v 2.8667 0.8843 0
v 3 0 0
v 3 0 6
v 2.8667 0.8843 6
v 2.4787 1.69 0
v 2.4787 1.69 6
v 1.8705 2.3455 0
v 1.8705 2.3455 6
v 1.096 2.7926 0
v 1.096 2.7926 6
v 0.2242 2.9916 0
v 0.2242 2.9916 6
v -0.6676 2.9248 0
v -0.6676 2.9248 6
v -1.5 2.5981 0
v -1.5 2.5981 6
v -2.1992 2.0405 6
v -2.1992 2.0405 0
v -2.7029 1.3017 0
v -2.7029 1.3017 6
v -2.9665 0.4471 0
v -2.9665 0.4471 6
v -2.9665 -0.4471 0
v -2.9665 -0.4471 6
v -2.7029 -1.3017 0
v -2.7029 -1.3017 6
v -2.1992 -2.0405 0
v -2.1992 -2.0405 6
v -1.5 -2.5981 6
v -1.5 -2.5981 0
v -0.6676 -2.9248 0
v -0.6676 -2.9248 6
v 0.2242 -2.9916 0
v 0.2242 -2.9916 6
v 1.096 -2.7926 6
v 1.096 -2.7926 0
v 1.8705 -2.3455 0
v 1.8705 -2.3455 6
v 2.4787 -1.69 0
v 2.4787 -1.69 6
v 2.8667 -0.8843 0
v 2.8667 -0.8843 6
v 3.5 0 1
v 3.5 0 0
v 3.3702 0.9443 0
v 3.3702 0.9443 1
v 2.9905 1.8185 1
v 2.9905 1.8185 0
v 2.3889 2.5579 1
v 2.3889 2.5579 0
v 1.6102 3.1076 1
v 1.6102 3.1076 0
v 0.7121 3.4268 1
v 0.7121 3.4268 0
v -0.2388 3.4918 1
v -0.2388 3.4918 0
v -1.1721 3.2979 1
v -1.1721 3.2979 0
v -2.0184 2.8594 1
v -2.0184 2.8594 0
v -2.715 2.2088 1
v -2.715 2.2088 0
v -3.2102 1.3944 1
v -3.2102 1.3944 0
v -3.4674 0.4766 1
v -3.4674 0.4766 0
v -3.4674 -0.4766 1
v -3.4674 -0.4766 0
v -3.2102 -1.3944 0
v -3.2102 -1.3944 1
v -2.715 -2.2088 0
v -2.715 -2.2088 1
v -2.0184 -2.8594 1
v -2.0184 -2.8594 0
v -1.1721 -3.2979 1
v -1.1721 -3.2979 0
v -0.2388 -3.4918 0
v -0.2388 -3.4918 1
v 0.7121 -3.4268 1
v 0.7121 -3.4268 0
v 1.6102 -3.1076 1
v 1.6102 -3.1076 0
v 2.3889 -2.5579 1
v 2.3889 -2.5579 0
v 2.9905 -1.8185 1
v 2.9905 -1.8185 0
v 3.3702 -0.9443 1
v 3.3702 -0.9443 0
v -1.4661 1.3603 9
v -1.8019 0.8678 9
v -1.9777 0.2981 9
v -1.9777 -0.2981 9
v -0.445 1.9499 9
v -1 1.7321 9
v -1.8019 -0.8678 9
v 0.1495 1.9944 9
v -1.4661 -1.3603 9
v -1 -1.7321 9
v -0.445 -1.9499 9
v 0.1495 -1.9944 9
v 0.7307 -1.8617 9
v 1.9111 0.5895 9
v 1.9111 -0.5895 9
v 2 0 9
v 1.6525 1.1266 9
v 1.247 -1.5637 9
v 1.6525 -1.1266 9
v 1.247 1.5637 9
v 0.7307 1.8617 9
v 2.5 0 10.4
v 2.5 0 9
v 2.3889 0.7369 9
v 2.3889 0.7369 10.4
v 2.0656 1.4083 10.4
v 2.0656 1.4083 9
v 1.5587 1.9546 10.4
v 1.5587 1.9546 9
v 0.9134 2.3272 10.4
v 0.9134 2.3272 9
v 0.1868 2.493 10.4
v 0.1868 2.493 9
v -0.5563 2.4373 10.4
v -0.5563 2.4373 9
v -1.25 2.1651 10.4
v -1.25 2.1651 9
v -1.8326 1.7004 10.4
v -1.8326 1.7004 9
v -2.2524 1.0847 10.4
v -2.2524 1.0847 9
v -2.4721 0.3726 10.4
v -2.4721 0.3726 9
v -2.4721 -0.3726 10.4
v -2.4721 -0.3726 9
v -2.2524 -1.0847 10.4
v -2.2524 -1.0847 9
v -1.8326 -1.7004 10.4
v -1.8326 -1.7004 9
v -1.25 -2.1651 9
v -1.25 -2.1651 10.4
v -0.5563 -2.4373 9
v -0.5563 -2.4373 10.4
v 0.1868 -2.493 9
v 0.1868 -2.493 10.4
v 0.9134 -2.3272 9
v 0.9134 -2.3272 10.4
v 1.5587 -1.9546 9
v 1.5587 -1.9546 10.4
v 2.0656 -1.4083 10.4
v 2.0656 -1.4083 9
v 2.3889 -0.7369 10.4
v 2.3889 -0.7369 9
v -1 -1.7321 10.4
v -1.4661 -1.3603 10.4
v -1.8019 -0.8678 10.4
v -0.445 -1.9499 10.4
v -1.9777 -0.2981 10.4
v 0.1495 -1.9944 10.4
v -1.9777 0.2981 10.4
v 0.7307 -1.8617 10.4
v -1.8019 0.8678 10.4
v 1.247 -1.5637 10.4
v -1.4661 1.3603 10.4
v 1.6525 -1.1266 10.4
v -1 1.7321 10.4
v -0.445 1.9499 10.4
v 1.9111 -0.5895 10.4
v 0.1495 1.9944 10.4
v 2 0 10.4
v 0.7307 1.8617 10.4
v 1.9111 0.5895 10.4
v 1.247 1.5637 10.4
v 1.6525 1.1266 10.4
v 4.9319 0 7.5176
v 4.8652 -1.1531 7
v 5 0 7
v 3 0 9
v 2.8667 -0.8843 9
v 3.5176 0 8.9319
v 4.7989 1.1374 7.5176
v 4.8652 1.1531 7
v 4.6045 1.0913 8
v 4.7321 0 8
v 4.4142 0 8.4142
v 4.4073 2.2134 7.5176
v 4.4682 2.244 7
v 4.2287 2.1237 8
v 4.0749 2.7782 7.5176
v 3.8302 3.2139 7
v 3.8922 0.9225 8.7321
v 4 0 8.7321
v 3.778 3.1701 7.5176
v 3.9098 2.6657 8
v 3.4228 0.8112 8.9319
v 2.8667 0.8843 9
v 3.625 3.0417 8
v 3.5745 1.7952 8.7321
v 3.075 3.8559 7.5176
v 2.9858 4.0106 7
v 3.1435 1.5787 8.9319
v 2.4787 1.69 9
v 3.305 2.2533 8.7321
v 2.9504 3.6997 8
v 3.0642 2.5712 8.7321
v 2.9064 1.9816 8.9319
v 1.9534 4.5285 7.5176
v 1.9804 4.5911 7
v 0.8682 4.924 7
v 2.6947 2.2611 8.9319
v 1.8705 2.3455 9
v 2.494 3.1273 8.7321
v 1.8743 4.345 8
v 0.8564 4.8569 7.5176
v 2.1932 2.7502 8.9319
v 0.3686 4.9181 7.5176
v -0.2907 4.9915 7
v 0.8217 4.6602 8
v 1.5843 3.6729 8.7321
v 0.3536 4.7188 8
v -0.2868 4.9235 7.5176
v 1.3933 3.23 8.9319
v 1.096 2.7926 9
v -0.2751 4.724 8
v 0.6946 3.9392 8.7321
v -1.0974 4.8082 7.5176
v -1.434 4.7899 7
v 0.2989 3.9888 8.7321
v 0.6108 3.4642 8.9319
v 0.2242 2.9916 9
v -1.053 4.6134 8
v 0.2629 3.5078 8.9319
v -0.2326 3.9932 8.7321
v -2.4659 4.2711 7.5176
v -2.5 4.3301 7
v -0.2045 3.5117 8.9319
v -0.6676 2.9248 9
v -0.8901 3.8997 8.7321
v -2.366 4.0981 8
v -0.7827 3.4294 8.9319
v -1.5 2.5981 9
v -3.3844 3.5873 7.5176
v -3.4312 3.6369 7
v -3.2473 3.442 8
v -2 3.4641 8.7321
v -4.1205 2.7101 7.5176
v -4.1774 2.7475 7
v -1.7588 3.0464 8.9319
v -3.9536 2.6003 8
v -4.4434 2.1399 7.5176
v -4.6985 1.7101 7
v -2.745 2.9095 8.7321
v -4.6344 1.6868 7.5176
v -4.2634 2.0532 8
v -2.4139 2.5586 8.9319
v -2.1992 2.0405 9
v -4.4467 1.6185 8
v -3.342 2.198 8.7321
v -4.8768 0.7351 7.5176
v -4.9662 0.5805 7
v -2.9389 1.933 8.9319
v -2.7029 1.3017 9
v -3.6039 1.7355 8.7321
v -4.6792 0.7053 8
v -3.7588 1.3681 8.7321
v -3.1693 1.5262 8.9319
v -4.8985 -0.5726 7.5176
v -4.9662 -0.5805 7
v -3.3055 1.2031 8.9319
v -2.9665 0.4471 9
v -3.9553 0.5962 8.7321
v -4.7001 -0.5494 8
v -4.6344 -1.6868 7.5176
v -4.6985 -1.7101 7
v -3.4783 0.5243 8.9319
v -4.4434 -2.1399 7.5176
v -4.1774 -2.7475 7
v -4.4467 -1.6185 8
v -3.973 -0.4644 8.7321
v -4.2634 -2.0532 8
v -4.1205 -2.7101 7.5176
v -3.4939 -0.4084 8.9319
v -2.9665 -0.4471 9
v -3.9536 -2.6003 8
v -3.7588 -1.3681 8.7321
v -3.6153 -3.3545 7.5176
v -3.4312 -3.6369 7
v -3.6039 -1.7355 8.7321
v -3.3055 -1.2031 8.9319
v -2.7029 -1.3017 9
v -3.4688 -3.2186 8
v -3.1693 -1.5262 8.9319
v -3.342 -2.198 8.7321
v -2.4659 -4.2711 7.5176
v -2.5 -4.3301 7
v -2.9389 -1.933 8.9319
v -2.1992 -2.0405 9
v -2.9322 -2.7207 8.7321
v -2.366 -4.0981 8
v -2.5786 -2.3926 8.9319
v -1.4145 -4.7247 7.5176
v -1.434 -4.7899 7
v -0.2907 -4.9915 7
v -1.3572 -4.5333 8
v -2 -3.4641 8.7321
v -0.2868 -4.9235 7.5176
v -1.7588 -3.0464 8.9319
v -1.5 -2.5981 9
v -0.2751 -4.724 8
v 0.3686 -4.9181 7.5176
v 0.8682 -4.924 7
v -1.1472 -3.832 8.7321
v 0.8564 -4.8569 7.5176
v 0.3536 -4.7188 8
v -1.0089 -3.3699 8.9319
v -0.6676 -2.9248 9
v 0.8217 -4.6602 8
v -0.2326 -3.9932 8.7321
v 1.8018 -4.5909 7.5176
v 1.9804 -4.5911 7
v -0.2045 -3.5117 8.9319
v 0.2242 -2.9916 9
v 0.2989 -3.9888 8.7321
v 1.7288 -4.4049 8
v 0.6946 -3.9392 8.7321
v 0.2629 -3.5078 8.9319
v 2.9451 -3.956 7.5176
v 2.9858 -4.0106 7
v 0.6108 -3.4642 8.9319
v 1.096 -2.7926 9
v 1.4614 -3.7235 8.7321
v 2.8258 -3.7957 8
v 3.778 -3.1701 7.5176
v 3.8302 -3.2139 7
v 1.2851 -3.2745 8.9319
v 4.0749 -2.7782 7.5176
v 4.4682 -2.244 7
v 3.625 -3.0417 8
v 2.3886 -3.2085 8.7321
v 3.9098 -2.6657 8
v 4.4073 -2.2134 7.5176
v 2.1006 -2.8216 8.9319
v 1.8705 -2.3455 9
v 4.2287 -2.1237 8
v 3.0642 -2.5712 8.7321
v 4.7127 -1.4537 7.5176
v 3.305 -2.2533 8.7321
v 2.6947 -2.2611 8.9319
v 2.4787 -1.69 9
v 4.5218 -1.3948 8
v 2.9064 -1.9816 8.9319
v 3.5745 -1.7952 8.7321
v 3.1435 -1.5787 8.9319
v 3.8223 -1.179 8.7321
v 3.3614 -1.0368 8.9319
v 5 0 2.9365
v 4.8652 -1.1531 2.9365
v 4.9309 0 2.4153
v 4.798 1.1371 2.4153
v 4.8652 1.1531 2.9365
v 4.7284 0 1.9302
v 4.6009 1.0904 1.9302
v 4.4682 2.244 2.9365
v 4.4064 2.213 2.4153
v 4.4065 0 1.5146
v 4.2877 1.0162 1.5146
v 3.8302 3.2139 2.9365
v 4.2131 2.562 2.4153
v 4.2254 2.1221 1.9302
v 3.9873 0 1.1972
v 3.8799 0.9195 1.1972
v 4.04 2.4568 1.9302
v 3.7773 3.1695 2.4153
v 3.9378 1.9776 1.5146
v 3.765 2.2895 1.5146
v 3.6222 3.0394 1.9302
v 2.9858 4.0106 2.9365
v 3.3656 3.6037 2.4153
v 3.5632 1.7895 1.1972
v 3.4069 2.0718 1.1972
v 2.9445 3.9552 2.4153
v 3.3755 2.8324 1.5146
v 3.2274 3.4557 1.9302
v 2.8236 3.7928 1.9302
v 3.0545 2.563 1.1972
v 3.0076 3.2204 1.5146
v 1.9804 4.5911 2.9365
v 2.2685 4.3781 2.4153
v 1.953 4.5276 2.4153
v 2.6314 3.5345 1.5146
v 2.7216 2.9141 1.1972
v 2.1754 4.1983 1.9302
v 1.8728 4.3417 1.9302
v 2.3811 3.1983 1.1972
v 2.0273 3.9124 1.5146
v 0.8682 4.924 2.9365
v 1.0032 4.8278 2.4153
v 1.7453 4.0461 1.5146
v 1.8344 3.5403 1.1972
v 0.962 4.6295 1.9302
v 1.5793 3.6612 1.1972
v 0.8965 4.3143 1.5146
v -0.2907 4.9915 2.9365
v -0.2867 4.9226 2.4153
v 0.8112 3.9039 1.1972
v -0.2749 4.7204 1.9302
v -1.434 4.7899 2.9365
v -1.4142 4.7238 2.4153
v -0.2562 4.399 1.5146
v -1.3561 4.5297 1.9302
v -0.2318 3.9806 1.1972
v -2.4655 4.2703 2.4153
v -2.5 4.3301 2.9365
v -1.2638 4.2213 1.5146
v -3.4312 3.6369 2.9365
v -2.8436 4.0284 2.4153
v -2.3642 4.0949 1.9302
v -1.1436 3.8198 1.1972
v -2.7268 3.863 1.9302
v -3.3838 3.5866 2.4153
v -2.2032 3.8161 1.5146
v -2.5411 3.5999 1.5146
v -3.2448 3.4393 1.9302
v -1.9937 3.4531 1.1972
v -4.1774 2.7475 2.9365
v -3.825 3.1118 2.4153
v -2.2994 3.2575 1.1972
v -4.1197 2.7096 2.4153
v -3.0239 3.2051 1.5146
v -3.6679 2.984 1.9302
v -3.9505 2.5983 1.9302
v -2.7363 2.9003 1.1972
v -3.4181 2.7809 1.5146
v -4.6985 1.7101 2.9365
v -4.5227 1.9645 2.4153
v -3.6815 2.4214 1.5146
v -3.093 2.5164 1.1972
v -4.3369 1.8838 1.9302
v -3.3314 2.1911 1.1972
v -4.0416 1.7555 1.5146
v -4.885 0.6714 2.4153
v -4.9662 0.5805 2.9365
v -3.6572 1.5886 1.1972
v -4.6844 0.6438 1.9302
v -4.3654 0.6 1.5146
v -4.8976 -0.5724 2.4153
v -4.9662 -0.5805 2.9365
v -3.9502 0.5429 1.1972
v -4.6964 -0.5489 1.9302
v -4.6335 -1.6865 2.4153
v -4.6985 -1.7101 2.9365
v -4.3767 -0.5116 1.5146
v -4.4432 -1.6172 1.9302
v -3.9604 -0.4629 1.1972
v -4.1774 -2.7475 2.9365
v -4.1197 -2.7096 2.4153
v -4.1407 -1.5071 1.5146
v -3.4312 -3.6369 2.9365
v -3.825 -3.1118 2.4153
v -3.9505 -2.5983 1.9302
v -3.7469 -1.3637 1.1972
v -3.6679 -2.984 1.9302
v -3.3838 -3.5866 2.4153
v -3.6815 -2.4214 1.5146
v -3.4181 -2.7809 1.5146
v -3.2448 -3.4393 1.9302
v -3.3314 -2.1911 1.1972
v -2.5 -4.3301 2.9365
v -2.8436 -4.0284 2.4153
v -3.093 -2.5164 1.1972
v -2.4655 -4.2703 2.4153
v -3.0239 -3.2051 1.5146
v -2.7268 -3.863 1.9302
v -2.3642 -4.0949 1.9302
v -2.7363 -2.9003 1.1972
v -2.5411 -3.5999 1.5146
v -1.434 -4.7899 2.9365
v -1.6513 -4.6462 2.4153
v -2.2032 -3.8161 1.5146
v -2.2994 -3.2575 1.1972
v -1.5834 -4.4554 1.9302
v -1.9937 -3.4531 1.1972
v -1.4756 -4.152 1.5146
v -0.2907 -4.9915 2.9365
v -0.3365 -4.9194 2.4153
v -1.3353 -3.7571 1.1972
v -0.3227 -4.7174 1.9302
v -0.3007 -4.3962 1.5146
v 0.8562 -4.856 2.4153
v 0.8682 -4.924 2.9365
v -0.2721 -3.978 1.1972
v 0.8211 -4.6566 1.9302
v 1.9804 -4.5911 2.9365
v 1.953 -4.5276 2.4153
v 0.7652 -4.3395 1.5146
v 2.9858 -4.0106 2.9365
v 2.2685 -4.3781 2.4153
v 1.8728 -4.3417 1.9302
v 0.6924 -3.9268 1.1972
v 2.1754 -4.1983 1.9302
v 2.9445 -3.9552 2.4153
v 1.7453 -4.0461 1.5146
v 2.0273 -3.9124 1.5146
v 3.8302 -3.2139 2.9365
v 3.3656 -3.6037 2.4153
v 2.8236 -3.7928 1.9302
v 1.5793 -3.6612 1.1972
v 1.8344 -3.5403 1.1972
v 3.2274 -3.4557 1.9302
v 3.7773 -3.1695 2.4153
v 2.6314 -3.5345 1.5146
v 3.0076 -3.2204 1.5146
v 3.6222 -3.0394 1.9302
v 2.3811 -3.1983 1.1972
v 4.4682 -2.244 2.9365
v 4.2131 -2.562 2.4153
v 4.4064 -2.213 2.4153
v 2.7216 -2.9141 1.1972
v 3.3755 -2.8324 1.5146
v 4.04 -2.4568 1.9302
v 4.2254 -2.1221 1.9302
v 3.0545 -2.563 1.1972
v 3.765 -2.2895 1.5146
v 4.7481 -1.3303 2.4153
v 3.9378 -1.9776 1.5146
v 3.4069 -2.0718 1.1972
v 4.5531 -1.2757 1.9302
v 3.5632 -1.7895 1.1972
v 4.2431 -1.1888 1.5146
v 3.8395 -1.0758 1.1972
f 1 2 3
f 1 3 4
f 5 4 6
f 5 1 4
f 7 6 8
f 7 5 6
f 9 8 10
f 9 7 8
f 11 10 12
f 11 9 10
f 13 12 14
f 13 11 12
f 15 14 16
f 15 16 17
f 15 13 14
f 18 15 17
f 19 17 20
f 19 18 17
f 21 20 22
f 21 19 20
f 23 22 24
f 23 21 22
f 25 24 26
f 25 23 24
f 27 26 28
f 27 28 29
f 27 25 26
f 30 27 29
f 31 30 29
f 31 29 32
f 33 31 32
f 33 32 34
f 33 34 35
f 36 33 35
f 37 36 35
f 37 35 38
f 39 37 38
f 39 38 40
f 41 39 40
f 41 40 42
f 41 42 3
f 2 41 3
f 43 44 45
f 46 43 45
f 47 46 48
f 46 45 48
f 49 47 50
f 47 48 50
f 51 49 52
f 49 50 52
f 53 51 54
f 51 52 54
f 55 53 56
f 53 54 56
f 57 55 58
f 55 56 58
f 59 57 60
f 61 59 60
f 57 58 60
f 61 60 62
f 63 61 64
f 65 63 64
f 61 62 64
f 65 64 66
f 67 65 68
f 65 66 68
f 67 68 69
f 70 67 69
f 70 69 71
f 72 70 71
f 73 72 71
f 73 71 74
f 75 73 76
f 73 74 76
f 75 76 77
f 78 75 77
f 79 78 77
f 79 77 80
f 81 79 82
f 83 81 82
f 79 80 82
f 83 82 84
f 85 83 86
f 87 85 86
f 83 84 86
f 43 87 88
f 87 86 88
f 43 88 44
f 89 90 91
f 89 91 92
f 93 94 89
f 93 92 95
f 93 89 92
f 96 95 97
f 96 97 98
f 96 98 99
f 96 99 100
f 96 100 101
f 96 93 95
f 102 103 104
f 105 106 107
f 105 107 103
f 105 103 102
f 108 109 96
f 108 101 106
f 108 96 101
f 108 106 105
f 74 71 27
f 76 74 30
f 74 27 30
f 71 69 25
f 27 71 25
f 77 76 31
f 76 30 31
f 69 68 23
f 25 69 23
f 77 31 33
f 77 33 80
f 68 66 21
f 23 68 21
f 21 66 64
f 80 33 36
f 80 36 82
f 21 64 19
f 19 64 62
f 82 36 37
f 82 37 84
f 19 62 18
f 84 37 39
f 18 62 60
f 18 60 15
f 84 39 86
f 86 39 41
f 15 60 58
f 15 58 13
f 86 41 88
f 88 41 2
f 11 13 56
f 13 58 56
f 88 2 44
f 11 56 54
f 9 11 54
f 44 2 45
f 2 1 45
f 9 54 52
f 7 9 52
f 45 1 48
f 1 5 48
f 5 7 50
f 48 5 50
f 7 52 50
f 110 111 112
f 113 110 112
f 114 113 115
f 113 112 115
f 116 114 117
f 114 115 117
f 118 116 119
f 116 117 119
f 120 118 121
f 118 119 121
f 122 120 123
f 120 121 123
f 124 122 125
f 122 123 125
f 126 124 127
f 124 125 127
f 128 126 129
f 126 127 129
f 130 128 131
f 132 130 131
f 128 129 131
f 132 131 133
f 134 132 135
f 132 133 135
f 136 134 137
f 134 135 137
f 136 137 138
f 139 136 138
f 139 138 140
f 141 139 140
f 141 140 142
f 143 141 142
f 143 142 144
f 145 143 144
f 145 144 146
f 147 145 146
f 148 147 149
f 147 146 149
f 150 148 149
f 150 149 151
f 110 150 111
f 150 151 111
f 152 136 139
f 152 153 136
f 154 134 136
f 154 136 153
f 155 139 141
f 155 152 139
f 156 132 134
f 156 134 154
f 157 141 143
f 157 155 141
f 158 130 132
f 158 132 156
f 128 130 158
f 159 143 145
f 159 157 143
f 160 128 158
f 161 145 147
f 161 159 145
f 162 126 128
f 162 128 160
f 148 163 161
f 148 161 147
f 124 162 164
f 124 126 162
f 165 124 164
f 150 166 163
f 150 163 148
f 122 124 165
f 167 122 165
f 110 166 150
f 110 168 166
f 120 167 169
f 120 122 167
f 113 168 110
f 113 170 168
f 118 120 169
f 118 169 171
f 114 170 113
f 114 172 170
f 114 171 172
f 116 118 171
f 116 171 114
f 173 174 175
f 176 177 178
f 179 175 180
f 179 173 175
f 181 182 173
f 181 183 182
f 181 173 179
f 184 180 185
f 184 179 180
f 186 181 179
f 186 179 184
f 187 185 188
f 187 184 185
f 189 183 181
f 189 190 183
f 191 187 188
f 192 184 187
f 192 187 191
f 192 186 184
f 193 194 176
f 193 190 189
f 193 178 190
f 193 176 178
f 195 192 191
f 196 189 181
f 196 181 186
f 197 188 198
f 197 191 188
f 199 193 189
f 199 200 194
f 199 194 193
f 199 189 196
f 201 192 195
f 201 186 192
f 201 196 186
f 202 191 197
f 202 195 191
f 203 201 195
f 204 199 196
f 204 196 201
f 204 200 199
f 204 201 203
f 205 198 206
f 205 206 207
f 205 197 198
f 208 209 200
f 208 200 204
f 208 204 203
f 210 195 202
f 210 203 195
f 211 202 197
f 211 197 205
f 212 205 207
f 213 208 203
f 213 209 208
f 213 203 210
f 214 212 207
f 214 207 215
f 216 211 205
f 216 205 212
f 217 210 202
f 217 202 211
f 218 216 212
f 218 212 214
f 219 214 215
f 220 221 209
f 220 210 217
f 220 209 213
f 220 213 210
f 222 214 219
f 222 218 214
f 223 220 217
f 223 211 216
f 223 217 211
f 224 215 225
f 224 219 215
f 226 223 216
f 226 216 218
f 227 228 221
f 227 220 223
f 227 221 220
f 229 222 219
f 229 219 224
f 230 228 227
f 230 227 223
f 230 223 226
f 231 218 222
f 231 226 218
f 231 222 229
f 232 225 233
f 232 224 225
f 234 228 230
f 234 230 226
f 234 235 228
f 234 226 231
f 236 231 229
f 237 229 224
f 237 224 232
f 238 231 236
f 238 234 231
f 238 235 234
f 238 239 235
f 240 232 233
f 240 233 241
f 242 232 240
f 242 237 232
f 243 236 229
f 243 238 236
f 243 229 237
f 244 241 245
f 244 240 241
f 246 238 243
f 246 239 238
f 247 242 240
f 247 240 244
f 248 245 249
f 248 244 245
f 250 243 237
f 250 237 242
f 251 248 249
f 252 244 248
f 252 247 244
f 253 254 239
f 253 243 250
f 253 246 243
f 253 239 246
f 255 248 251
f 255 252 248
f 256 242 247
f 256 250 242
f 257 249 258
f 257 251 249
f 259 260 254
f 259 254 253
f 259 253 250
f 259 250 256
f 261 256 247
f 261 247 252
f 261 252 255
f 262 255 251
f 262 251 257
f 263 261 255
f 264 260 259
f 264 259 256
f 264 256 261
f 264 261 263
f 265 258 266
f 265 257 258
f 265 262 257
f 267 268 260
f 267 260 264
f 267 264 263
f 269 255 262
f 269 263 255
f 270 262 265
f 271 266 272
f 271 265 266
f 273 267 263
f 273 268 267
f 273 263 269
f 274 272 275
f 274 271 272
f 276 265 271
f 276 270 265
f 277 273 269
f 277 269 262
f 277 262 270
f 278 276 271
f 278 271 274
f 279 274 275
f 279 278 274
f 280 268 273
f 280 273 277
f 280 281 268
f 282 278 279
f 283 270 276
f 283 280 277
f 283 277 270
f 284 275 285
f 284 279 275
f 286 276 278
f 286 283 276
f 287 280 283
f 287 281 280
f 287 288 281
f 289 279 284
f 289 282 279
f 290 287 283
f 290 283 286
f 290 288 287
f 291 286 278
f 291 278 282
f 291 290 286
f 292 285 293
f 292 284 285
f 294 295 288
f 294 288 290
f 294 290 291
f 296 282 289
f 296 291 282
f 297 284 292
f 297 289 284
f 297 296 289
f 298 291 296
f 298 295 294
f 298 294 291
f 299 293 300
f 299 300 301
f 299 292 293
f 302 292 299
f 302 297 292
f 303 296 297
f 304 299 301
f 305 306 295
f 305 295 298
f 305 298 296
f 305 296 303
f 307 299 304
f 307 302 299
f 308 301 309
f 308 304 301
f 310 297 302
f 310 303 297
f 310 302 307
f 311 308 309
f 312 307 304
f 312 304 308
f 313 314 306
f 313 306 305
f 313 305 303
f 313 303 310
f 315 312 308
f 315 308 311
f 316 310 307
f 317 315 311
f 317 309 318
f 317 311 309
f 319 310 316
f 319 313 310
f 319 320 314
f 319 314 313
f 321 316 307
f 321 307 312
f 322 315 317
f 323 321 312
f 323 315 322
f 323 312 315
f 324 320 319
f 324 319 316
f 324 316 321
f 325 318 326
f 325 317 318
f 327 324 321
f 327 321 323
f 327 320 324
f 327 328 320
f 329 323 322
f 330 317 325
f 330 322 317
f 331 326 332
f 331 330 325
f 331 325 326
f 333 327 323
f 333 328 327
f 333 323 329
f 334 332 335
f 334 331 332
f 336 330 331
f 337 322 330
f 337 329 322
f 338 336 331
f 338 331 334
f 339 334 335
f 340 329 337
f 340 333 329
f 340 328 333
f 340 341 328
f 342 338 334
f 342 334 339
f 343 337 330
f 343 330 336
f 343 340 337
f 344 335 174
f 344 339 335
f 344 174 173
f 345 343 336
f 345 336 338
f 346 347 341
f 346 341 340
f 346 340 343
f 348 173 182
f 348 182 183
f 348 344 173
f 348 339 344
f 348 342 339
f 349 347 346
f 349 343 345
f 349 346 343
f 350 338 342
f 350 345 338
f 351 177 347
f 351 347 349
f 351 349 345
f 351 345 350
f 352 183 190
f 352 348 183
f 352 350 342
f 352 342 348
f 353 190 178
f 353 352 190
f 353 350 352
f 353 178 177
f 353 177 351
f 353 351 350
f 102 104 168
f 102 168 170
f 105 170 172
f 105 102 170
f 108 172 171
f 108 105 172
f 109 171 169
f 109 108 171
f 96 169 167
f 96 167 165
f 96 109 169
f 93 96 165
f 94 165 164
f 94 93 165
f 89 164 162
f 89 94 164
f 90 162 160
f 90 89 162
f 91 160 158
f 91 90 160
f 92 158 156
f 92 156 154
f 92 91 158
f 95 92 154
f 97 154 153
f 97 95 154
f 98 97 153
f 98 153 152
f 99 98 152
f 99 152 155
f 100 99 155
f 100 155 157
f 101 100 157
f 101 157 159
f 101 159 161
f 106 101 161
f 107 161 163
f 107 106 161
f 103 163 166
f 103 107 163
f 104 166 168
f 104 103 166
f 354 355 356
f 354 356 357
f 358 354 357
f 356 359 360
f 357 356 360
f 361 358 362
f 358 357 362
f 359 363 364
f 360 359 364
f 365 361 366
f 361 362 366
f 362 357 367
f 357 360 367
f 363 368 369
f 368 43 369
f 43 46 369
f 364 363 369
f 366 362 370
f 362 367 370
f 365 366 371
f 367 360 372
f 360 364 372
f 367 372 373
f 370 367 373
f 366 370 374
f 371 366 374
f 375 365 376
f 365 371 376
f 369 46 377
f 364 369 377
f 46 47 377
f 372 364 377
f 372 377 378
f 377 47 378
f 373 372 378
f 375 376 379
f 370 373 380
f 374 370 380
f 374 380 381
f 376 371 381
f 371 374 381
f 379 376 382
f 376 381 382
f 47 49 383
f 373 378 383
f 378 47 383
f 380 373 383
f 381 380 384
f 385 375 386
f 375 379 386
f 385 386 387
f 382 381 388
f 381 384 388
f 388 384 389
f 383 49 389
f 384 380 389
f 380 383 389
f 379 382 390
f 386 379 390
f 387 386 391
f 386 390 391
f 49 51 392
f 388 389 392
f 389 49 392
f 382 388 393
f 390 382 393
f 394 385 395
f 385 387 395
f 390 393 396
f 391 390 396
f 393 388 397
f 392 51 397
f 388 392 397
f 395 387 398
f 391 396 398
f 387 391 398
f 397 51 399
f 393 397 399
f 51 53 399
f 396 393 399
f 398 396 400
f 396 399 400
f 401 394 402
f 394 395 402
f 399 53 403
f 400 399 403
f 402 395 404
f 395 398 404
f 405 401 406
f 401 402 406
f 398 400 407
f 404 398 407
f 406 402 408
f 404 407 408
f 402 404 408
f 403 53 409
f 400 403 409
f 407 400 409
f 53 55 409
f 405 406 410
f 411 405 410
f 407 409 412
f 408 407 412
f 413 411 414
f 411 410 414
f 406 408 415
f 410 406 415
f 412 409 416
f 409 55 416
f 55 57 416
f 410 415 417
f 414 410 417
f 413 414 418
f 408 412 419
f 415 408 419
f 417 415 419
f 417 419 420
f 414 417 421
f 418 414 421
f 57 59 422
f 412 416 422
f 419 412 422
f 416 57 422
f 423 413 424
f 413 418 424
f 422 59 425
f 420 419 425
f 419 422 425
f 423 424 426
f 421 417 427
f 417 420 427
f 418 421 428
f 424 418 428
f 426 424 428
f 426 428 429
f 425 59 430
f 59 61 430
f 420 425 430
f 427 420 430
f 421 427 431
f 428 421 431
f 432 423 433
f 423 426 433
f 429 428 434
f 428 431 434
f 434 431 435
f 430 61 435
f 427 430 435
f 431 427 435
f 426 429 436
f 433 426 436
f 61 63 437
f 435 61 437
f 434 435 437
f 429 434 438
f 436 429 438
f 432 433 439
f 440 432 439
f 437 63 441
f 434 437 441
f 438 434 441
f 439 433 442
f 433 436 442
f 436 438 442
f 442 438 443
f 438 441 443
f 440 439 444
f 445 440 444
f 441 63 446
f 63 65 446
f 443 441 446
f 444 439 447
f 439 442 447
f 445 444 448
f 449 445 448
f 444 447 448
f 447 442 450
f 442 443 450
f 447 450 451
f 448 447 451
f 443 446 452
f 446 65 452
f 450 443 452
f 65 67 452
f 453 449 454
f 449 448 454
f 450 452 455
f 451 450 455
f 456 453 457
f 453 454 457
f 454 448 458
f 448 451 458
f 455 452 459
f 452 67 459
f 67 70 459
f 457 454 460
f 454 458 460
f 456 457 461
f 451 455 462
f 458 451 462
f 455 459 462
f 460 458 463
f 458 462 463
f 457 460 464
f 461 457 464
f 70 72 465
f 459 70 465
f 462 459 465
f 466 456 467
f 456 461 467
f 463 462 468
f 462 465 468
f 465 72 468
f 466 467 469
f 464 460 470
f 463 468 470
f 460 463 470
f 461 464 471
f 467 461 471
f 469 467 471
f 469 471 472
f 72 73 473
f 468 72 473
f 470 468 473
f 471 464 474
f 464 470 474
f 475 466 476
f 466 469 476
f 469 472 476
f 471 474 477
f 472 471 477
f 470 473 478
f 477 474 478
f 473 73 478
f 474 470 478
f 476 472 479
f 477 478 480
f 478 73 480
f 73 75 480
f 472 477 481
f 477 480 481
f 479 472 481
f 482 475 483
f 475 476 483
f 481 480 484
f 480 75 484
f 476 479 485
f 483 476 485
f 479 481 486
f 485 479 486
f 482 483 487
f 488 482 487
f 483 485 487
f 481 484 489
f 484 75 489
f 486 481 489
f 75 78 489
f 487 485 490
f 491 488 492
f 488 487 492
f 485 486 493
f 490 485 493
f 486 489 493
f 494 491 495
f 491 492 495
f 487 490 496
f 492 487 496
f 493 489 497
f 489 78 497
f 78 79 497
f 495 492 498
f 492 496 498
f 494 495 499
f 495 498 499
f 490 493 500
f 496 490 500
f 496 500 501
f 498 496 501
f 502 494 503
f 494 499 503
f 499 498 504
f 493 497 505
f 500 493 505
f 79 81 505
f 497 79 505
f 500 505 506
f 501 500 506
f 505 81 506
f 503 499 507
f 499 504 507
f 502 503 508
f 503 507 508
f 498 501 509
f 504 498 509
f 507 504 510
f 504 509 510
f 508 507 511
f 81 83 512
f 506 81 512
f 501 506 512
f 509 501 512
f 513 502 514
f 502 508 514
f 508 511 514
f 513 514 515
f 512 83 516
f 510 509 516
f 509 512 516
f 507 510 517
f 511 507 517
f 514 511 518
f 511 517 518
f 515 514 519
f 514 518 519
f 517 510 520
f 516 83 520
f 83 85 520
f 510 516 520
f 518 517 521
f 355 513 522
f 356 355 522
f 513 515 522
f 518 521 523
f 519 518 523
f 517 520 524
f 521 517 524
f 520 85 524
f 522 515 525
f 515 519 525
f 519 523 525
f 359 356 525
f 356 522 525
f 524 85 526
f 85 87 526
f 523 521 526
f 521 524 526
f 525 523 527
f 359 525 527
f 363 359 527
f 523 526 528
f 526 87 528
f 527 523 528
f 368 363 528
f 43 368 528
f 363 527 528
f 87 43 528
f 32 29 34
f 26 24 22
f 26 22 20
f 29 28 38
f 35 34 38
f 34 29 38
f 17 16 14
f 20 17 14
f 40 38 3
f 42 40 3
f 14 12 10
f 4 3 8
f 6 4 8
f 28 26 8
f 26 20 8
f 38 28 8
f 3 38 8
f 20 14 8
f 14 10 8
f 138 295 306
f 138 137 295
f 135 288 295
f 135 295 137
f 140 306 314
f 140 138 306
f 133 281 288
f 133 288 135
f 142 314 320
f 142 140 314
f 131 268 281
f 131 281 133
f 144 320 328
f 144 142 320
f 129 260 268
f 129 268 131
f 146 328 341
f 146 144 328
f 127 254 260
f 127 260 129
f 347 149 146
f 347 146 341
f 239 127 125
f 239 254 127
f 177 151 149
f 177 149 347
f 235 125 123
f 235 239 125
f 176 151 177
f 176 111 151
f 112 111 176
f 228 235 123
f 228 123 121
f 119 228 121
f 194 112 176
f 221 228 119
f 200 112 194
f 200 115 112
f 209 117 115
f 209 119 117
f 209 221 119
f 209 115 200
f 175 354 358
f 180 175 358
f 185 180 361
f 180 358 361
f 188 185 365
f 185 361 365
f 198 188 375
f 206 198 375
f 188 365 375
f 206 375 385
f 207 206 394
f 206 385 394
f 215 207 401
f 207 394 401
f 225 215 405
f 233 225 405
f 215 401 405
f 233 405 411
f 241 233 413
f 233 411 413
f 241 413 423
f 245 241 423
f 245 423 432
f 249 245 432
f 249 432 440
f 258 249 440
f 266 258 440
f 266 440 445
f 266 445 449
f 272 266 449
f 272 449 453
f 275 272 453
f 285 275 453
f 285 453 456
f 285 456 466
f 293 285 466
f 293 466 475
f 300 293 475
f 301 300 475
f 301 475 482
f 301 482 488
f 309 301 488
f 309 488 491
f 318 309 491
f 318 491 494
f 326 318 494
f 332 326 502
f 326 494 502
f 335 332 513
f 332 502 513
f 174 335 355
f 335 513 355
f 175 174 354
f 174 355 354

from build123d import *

# Parameters (mm, degrees)
F0_R     = 3.5
F0_R_2   = 3
F1_DEPTH = 1
F2_R     = 5
F2_R_2   = 3.5
F2_R_3   = 3
F3_DEPTH = 8
F4_R     = 2.5
F4_R_2   = 2
F5_DEPTH = 1.4
F7_DEPTH = 5


# Not quite as in the source:
# - a fillet or chamfer that OpenCascade refuses, or shapes differently, is made with other operations: its cross-section is extruded or revolved along the edge and cut away or added


with BuildPart() as f1:
    # F0 (on Top) → F1 (new body)
    with BuildSketch(Plane.XY):
        Circle(F0_R)
        Circle(F0_R_2, mode=Mode.SUBTRACT)
    extrude(amount=F1_DEPTH)

    # F2 (on face) → F3 (join)
    with BuildSketch(Plane.XY.offset(1)):
        Circle(F2_R)
        Circle(F2_R_2, mode=Mode.SUBTRACT)
        Circle(F2_R_2)
        Circle(F2_R_3, mode=Mode.SUBTRACT)
        Circle(F2_R_3)
    extrude(amount=F3_DEPTH)

    # F4 (on face) → F5 (join)
    with BuildSketch(Plane.XY.offset(9)):
        Circle(F4_R)
        Circle(F4_R_2, mode=Mode.SUBTRACT)
    extrude(amount=F5_DEPTH)

    # F6: fillet of radius 2 on 2 edges, made by hand

    # F6_s1 → F6_t2 (revolve, cut)
    with BuildSketch(Plane.XZ):
        with BuildLine():
            ThreePointArc((5, 7), (4.4142135624, 8.4142135624), (3, 9))
            Line((3, 9), (5, 9))
            Line((5, 9), (5, 7))
        make_face()
    revolve(axis=Axis((0, 0, 9), (0, 0, 1)), mode=Mode.SUBTRACT)

    # F6_s3 → F6_t4 (revolve, cut)
    with BuildSketch(Plane.XZ):
        with BuildLine():
            ThreePointArc((5, 2.9364916731), (4.5811388301, 1.7117468017), (3.5, 1))
            Line((3.5, 1), (5, 1))
            Line((5, 1), (5, 2.9364916731))
        make_face()
    revolve(axis=Axis((0, 0, 1), (0, 0, 1)), mode=Mode.SUBTRACT)

    # F7 (cut): a face of the model
    f7_faces = [f1.faces().sort_by_distance(p)[0] for p in [
        (0, 0, 1),
    ]]
    extrude(f7_faces, amount=-F7_DEPTH, mode=Mode.SUBTRACT)


solid = f1.part
